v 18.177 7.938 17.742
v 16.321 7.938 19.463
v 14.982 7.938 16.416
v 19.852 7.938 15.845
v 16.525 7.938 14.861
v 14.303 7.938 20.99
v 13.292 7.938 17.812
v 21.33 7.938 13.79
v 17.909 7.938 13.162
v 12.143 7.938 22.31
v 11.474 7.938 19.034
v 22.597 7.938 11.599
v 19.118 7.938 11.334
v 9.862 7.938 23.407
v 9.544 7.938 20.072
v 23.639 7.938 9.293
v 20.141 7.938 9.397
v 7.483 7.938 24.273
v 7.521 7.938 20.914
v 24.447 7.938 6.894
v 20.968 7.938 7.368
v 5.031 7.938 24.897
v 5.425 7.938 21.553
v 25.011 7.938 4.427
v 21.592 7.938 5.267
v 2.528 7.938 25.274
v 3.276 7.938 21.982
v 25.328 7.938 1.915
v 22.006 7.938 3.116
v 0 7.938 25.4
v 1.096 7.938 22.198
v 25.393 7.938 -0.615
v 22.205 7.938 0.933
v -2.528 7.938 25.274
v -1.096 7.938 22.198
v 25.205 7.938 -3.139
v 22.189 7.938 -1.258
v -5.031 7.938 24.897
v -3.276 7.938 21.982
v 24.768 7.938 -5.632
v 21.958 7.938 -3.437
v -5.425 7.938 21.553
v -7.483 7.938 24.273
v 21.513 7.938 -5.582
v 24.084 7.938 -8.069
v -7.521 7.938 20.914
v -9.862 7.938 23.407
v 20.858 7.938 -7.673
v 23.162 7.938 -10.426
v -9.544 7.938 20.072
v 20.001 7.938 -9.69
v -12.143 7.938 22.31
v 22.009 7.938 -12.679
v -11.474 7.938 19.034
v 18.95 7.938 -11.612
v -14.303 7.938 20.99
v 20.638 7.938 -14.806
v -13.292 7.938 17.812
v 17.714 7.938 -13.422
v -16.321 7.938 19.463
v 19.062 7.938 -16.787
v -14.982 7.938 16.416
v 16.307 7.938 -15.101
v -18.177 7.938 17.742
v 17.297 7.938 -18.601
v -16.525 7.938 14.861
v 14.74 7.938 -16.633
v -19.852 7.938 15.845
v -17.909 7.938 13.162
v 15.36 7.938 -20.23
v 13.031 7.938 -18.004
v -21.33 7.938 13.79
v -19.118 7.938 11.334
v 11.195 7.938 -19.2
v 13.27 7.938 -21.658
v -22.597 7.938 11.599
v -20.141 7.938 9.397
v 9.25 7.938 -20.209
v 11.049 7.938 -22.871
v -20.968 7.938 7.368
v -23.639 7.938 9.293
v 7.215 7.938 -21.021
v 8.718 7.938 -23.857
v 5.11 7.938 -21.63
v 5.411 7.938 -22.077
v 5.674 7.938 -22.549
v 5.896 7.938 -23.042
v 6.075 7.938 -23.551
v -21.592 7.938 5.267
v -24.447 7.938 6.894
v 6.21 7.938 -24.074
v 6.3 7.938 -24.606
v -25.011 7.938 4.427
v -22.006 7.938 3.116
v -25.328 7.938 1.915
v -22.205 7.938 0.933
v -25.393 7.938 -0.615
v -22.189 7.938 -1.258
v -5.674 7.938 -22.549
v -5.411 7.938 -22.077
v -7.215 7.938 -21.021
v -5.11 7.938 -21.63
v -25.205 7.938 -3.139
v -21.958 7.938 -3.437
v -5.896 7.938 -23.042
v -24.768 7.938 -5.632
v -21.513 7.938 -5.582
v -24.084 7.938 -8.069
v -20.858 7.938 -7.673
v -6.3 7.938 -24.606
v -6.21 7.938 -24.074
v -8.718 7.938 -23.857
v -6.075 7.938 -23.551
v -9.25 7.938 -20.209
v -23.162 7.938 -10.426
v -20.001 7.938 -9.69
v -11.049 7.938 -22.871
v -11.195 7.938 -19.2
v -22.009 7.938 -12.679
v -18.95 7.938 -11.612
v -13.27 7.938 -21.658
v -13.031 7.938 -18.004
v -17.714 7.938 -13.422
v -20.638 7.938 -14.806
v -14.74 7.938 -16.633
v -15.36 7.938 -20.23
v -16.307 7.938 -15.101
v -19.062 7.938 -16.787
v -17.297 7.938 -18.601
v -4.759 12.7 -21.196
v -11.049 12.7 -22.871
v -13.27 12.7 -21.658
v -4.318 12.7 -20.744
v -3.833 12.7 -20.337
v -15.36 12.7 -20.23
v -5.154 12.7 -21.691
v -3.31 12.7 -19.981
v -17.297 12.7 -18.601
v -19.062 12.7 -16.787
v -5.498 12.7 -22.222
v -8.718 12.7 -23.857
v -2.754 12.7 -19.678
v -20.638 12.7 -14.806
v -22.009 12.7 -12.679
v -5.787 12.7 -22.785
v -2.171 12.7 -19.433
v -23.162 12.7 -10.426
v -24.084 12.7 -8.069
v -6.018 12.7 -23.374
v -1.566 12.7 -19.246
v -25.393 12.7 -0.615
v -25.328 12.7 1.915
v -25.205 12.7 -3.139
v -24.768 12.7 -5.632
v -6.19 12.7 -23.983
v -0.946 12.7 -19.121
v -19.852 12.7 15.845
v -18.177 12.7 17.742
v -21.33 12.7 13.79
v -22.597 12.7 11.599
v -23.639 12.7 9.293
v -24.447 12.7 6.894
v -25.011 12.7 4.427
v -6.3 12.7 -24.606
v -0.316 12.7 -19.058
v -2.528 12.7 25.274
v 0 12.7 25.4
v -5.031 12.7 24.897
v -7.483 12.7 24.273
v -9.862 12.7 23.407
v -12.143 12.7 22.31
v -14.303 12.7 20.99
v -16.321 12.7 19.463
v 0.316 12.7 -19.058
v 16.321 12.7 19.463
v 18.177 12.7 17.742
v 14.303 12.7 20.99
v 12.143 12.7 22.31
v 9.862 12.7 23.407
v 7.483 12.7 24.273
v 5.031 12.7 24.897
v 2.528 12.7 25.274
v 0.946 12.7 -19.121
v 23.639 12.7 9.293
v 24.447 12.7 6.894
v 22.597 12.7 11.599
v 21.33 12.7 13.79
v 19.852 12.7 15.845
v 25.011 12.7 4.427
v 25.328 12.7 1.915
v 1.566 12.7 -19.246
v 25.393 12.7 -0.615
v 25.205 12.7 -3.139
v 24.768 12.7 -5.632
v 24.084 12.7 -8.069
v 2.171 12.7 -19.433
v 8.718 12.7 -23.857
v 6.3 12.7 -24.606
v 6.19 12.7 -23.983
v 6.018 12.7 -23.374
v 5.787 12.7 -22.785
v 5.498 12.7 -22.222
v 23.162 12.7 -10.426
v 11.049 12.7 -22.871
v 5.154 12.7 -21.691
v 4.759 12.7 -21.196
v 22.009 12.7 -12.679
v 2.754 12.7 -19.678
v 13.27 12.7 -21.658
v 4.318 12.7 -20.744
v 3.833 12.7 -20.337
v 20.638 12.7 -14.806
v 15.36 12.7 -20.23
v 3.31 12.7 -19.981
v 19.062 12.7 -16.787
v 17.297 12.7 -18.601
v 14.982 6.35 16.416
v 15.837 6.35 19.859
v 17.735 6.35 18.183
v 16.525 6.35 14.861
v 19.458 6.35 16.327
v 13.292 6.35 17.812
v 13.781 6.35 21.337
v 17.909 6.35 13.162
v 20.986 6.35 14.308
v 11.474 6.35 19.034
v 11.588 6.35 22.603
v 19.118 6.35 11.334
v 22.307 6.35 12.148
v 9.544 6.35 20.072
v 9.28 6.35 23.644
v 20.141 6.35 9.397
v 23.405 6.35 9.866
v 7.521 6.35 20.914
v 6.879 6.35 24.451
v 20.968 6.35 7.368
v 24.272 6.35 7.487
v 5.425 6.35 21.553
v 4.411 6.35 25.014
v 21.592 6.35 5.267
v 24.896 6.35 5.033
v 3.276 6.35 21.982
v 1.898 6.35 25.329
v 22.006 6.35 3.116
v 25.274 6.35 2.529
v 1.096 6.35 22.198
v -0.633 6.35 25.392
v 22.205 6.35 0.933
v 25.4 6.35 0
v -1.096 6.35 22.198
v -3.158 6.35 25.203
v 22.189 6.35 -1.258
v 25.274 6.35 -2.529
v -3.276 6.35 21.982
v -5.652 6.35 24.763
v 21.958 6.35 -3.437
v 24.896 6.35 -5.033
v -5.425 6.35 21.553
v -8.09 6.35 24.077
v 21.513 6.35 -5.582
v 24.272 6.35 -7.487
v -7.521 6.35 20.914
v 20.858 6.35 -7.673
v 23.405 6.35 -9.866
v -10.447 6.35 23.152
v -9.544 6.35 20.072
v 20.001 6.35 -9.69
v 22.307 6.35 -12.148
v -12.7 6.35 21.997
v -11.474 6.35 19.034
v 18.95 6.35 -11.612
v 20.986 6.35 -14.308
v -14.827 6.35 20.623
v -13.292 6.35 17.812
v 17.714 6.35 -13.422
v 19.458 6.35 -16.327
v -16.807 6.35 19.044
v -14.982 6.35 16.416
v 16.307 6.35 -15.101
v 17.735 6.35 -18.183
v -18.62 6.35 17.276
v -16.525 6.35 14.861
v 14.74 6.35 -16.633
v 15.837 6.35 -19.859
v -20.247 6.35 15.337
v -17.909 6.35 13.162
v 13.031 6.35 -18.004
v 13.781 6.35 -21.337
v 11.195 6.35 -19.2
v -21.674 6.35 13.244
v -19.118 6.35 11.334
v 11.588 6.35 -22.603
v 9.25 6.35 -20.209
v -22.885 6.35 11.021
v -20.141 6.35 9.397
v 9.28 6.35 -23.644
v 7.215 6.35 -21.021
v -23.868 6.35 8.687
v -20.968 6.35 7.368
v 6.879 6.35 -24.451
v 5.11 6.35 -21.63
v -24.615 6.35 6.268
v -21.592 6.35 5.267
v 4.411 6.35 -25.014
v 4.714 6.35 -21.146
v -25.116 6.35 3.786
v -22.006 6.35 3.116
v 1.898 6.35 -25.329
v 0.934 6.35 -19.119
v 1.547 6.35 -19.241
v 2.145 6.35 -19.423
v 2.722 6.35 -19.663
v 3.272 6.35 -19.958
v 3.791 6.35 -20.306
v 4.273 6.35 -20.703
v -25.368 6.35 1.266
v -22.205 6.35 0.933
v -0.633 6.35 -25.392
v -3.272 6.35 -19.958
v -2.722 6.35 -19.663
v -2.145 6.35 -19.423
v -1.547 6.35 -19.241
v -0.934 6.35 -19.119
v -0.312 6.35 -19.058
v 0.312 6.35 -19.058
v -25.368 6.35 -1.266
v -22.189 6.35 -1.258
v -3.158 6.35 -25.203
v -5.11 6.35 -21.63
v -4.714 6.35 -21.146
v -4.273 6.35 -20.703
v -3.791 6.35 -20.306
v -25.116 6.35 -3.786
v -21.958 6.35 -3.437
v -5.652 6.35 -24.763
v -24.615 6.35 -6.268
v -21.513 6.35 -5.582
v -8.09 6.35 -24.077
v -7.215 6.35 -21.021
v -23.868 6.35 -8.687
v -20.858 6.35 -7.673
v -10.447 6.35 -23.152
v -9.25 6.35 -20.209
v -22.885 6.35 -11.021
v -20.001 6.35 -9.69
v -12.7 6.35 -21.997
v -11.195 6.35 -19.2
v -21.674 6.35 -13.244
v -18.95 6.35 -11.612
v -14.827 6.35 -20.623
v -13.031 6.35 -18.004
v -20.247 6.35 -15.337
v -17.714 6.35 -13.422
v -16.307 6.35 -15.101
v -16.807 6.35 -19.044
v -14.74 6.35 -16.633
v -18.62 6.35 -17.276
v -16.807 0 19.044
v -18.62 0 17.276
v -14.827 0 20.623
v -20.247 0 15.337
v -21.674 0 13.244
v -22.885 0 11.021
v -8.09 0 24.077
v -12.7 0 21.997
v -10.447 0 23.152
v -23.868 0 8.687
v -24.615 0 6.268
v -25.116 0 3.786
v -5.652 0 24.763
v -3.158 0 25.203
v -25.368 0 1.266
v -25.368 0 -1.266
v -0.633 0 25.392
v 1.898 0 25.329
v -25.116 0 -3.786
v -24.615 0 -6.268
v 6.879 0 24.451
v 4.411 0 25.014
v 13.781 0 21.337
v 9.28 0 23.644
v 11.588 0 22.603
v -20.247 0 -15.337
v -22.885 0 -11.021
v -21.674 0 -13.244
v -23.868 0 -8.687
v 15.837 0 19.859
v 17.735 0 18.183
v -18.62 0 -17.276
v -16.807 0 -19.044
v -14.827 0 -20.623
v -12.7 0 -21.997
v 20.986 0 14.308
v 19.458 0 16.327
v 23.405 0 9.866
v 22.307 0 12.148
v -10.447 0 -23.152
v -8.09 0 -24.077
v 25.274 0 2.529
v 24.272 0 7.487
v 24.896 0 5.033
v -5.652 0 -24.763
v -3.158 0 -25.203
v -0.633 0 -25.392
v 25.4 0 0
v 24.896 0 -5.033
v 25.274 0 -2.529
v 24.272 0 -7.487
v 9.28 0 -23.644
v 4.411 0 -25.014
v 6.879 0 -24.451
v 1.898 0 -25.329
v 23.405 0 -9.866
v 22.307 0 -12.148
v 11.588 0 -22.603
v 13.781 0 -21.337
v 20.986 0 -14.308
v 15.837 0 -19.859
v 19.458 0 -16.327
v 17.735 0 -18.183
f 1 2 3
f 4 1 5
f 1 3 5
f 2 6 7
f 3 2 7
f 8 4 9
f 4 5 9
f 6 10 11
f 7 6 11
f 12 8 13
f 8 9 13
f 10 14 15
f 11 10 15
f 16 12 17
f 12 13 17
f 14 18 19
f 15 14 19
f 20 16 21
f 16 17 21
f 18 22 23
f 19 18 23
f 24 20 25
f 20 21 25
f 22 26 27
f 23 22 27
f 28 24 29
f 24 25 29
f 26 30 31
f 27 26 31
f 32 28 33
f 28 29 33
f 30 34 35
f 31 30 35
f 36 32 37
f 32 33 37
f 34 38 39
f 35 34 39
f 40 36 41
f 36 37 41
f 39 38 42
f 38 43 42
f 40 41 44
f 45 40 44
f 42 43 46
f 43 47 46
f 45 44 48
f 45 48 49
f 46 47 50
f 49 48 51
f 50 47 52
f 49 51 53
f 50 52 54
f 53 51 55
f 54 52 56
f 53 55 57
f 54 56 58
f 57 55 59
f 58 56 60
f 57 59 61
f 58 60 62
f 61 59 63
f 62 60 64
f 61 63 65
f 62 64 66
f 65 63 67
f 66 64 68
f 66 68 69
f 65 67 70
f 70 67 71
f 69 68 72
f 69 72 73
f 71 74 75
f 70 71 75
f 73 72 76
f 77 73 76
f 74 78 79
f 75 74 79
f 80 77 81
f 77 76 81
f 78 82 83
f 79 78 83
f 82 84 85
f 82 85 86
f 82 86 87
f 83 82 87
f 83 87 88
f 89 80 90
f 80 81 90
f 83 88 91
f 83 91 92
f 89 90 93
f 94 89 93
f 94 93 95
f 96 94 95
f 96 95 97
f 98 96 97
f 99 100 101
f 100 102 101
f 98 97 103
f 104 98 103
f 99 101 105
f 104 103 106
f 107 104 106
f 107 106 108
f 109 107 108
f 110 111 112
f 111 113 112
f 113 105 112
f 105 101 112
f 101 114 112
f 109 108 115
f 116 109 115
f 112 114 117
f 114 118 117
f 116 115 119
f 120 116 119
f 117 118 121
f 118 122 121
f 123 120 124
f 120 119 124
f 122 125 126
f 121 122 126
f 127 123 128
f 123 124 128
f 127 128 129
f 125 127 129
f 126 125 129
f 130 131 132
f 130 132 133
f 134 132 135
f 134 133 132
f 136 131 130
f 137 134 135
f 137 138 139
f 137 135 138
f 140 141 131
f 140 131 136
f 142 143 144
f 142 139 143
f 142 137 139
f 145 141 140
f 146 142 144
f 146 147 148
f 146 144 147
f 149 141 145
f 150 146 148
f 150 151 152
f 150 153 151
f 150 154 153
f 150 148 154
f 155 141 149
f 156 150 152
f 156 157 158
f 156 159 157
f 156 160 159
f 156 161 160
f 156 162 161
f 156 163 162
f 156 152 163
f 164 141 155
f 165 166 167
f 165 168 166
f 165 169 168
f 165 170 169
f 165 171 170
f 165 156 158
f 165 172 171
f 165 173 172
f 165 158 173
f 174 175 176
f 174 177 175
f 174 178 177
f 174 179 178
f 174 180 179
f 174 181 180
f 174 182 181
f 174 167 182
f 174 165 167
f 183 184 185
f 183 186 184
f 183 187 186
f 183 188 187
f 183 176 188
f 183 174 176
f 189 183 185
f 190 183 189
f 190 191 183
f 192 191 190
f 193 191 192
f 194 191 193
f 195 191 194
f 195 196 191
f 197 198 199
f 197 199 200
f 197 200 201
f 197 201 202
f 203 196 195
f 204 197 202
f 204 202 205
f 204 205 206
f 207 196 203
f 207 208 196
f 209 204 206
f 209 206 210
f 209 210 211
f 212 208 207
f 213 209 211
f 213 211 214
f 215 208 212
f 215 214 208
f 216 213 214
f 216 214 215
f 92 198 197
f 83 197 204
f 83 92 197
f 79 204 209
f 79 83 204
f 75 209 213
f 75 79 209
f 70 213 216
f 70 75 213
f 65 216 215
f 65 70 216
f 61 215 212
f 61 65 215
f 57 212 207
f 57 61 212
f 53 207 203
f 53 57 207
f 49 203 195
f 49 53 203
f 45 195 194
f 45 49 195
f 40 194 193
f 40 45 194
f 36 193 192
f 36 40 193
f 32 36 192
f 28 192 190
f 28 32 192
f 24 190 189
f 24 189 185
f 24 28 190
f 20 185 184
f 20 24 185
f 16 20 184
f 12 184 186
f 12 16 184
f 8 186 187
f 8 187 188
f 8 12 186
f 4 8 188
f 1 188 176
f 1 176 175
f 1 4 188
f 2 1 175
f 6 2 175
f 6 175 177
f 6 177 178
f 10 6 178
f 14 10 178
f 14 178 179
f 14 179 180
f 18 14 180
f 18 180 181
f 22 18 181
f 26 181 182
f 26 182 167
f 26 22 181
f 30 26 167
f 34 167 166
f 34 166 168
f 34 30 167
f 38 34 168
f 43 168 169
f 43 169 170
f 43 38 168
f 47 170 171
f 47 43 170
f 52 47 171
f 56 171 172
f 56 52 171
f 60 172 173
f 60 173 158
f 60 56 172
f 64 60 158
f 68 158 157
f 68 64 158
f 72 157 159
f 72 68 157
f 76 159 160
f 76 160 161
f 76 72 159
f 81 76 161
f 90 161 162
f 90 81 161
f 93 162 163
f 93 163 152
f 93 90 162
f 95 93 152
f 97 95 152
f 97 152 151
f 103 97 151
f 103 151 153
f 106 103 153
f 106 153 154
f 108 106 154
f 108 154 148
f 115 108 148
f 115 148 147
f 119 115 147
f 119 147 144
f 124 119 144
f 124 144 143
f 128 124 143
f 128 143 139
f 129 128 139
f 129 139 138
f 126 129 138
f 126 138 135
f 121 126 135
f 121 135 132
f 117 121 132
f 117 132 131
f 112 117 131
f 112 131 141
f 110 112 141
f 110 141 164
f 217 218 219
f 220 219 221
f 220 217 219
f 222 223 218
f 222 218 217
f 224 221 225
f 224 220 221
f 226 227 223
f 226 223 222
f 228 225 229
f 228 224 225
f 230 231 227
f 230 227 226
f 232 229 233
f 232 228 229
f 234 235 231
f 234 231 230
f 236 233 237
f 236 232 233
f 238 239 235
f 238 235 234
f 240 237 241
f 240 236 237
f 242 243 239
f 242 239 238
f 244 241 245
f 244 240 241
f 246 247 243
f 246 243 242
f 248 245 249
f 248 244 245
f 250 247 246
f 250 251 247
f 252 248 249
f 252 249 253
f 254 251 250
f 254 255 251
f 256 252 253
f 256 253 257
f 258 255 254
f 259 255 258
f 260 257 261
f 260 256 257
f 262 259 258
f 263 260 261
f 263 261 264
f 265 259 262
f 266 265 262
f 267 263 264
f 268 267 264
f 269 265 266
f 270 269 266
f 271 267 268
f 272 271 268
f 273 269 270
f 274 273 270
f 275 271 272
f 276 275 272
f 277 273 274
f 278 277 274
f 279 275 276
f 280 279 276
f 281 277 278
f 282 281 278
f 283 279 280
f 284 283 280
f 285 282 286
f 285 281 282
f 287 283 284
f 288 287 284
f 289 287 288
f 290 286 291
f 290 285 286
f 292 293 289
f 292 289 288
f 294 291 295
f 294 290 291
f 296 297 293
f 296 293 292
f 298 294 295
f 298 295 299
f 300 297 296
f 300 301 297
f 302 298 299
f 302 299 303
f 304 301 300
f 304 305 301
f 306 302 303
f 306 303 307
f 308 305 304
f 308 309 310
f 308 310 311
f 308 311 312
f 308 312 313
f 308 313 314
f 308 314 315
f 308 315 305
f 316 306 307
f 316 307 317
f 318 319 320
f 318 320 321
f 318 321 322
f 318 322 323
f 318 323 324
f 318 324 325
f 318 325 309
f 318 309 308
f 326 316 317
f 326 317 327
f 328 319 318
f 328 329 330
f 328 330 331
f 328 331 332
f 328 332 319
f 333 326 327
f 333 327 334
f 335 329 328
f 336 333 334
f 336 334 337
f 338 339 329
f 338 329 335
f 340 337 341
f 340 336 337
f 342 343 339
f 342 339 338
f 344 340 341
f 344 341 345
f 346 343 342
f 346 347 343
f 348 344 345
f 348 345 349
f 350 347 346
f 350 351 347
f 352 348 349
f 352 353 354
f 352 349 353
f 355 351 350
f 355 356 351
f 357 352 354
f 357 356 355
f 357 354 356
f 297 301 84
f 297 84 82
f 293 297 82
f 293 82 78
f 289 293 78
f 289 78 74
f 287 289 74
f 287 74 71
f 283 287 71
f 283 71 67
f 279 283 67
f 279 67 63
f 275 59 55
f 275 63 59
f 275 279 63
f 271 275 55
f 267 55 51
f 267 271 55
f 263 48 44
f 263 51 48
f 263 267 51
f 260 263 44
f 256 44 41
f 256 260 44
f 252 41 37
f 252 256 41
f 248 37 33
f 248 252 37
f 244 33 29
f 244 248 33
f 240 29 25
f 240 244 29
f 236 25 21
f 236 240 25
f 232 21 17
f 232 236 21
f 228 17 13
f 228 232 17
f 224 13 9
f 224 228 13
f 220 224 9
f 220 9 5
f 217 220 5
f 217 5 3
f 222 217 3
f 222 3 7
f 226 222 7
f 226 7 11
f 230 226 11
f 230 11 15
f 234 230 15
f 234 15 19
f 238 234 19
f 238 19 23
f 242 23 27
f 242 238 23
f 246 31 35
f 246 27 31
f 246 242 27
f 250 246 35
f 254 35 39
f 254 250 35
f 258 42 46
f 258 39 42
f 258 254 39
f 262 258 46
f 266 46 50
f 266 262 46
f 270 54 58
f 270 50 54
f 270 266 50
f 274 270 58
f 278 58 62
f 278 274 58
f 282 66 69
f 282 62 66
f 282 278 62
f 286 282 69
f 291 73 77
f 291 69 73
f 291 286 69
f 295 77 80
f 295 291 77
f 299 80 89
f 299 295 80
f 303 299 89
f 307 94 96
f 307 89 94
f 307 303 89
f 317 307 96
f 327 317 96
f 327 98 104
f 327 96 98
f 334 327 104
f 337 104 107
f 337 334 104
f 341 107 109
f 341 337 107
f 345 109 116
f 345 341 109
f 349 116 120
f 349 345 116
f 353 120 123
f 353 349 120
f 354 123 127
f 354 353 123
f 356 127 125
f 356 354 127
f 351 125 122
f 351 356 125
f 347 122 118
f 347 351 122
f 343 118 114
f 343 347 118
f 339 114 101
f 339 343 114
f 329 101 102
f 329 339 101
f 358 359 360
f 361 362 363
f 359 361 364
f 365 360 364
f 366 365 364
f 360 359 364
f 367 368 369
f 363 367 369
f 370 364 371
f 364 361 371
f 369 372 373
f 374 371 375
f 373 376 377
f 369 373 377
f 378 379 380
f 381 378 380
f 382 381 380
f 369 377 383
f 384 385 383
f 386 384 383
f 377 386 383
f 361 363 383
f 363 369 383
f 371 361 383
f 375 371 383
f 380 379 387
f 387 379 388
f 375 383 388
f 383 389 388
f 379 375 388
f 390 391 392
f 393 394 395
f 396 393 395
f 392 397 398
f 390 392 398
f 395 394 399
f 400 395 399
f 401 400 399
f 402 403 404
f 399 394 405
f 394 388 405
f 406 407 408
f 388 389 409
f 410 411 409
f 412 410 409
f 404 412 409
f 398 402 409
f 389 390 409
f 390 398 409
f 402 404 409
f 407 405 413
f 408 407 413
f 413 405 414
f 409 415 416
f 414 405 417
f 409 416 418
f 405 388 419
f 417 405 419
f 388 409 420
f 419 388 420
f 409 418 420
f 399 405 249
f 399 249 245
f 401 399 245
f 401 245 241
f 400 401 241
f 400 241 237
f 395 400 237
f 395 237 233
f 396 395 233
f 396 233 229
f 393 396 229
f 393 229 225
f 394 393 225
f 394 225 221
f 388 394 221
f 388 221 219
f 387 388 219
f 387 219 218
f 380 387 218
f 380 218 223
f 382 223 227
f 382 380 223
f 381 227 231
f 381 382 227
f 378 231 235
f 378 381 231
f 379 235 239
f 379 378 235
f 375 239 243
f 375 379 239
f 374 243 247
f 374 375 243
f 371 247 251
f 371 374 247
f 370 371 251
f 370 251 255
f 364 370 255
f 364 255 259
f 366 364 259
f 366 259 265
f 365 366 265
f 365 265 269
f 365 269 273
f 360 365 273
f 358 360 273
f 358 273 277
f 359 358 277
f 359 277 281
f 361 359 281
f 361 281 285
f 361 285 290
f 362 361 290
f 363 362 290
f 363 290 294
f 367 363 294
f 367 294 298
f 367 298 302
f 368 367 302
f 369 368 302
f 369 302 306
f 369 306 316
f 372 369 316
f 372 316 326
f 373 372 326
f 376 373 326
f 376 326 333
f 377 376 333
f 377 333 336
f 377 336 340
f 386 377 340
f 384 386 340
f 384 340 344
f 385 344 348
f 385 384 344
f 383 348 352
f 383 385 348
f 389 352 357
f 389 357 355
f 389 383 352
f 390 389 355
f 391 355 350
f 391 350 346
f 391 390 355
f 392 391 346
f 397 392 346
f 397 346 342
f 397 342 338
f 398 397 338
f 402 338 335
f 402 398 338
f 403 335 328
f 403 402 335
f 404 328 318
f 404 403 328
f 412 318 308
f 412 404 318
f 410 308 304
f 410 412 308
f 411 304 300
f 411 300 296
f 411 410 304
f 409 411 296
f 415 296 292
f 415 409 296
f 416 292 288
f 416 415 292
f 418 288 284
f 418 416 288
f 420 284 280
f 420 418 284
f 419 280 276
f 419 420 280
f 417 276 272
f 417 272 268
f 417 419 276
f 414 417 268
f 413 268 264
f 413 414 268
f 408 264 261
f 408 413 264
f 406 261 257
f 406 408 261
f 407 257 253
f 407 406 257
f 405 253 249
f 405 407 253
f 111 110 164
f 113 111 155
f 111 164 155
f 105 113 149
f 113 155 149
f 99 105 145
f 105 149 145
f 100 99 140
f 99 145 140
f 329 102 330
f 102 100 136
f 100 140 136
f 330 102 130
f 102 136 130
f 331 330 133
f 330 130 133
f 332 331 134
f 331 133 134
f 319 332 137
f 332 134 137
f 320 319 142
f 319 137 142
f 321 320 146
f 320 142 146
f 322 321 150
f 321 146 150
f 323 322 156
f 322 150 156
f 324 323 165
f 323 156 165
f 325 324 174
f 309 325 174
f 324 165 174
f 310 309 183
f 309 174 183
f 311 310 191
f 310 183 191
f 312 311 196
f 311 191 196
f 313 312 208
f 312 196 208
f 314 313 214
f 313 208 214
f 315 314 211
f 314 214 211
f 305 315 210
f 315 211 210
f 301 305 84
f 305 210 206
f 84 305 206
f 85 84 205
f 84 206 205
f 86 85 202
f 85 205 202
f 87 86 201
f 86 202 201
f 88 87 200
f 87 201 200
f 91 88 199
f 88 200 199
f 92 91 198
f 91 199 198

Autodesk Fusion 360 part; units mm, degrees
sketch "Sketch1" plane through (0, 0, 0) normal (0, 1, 0) x (1, 0, 0)
  circle A0 centre (0, 0) radius 25.4
  dimension "d1" = 50.8
extrude "Extrude1" add sketch "Sketch1" along normal blind 12.7
sketch "Sketch2" plane through (0, 12.7, 0) normal (0, 1, 0) x (-1, 0, 0)
  circle A0 centre (0, 0) radius 25.4
  circle A1 centre (0, -25.4) radius 6.35
  dimension "d4" = 12.7
extrude "Extrude2" cut sketch "Sketch2" against normal blind 6.35 contours A0 A1 | A0 A1 picked at (-1.9477, -23.4128) picked at (2.1308, -27.1585)
sketch "Sketch3" plane through (0, 12.7, 0) normal (0, 1, 0) x (-1, 0, 0)
  arc A0 (6.3002, -24.6062) -> (-6.3002, -24.6062) centre (0, -25.4) ccw
  arc A1 (6.3002, -24.6063) -> (-6.3002, -24.6062) centre (0, 0) ccw
  circle A2 centre (0, -10.795) radius 4.7625
  circle A3 centre (0, -10.795) radius 2.5527
  dimension "d7" = 9.525
  dimension "d8" = 10.795
  dimension "d9" = 5.1054
sketch "Sketch4" plane through (0, 0, 0) normal (1, 0, 0) x (0, 0, -1)
  line L0 (25.4, 0) -> (25.4, 6.35)
  line L1 (-25.4, 12.7) -> (-25.4, 0)
  line L2 (19.05, 6.35) -> (24.6062, 6.35)
  line L3 (25.4, 6.35) -> (22.225, 6.35)
  line L4 (22.225, 7.9375) -> (25.4, 7.9375)
  line L5 (25.4, 7.9375) -> (25.4, 6.35)
  line L6 (22.225, 7.9375) -> (22.225, 6.35)
  dimension "d12" = 3.175
  dimension "d13" = 1.5875
revolve "Revolve1" cut sketch "Sketch4" angle 360 about axis through (0, 1.75, 0) along (0, 1, 0)
